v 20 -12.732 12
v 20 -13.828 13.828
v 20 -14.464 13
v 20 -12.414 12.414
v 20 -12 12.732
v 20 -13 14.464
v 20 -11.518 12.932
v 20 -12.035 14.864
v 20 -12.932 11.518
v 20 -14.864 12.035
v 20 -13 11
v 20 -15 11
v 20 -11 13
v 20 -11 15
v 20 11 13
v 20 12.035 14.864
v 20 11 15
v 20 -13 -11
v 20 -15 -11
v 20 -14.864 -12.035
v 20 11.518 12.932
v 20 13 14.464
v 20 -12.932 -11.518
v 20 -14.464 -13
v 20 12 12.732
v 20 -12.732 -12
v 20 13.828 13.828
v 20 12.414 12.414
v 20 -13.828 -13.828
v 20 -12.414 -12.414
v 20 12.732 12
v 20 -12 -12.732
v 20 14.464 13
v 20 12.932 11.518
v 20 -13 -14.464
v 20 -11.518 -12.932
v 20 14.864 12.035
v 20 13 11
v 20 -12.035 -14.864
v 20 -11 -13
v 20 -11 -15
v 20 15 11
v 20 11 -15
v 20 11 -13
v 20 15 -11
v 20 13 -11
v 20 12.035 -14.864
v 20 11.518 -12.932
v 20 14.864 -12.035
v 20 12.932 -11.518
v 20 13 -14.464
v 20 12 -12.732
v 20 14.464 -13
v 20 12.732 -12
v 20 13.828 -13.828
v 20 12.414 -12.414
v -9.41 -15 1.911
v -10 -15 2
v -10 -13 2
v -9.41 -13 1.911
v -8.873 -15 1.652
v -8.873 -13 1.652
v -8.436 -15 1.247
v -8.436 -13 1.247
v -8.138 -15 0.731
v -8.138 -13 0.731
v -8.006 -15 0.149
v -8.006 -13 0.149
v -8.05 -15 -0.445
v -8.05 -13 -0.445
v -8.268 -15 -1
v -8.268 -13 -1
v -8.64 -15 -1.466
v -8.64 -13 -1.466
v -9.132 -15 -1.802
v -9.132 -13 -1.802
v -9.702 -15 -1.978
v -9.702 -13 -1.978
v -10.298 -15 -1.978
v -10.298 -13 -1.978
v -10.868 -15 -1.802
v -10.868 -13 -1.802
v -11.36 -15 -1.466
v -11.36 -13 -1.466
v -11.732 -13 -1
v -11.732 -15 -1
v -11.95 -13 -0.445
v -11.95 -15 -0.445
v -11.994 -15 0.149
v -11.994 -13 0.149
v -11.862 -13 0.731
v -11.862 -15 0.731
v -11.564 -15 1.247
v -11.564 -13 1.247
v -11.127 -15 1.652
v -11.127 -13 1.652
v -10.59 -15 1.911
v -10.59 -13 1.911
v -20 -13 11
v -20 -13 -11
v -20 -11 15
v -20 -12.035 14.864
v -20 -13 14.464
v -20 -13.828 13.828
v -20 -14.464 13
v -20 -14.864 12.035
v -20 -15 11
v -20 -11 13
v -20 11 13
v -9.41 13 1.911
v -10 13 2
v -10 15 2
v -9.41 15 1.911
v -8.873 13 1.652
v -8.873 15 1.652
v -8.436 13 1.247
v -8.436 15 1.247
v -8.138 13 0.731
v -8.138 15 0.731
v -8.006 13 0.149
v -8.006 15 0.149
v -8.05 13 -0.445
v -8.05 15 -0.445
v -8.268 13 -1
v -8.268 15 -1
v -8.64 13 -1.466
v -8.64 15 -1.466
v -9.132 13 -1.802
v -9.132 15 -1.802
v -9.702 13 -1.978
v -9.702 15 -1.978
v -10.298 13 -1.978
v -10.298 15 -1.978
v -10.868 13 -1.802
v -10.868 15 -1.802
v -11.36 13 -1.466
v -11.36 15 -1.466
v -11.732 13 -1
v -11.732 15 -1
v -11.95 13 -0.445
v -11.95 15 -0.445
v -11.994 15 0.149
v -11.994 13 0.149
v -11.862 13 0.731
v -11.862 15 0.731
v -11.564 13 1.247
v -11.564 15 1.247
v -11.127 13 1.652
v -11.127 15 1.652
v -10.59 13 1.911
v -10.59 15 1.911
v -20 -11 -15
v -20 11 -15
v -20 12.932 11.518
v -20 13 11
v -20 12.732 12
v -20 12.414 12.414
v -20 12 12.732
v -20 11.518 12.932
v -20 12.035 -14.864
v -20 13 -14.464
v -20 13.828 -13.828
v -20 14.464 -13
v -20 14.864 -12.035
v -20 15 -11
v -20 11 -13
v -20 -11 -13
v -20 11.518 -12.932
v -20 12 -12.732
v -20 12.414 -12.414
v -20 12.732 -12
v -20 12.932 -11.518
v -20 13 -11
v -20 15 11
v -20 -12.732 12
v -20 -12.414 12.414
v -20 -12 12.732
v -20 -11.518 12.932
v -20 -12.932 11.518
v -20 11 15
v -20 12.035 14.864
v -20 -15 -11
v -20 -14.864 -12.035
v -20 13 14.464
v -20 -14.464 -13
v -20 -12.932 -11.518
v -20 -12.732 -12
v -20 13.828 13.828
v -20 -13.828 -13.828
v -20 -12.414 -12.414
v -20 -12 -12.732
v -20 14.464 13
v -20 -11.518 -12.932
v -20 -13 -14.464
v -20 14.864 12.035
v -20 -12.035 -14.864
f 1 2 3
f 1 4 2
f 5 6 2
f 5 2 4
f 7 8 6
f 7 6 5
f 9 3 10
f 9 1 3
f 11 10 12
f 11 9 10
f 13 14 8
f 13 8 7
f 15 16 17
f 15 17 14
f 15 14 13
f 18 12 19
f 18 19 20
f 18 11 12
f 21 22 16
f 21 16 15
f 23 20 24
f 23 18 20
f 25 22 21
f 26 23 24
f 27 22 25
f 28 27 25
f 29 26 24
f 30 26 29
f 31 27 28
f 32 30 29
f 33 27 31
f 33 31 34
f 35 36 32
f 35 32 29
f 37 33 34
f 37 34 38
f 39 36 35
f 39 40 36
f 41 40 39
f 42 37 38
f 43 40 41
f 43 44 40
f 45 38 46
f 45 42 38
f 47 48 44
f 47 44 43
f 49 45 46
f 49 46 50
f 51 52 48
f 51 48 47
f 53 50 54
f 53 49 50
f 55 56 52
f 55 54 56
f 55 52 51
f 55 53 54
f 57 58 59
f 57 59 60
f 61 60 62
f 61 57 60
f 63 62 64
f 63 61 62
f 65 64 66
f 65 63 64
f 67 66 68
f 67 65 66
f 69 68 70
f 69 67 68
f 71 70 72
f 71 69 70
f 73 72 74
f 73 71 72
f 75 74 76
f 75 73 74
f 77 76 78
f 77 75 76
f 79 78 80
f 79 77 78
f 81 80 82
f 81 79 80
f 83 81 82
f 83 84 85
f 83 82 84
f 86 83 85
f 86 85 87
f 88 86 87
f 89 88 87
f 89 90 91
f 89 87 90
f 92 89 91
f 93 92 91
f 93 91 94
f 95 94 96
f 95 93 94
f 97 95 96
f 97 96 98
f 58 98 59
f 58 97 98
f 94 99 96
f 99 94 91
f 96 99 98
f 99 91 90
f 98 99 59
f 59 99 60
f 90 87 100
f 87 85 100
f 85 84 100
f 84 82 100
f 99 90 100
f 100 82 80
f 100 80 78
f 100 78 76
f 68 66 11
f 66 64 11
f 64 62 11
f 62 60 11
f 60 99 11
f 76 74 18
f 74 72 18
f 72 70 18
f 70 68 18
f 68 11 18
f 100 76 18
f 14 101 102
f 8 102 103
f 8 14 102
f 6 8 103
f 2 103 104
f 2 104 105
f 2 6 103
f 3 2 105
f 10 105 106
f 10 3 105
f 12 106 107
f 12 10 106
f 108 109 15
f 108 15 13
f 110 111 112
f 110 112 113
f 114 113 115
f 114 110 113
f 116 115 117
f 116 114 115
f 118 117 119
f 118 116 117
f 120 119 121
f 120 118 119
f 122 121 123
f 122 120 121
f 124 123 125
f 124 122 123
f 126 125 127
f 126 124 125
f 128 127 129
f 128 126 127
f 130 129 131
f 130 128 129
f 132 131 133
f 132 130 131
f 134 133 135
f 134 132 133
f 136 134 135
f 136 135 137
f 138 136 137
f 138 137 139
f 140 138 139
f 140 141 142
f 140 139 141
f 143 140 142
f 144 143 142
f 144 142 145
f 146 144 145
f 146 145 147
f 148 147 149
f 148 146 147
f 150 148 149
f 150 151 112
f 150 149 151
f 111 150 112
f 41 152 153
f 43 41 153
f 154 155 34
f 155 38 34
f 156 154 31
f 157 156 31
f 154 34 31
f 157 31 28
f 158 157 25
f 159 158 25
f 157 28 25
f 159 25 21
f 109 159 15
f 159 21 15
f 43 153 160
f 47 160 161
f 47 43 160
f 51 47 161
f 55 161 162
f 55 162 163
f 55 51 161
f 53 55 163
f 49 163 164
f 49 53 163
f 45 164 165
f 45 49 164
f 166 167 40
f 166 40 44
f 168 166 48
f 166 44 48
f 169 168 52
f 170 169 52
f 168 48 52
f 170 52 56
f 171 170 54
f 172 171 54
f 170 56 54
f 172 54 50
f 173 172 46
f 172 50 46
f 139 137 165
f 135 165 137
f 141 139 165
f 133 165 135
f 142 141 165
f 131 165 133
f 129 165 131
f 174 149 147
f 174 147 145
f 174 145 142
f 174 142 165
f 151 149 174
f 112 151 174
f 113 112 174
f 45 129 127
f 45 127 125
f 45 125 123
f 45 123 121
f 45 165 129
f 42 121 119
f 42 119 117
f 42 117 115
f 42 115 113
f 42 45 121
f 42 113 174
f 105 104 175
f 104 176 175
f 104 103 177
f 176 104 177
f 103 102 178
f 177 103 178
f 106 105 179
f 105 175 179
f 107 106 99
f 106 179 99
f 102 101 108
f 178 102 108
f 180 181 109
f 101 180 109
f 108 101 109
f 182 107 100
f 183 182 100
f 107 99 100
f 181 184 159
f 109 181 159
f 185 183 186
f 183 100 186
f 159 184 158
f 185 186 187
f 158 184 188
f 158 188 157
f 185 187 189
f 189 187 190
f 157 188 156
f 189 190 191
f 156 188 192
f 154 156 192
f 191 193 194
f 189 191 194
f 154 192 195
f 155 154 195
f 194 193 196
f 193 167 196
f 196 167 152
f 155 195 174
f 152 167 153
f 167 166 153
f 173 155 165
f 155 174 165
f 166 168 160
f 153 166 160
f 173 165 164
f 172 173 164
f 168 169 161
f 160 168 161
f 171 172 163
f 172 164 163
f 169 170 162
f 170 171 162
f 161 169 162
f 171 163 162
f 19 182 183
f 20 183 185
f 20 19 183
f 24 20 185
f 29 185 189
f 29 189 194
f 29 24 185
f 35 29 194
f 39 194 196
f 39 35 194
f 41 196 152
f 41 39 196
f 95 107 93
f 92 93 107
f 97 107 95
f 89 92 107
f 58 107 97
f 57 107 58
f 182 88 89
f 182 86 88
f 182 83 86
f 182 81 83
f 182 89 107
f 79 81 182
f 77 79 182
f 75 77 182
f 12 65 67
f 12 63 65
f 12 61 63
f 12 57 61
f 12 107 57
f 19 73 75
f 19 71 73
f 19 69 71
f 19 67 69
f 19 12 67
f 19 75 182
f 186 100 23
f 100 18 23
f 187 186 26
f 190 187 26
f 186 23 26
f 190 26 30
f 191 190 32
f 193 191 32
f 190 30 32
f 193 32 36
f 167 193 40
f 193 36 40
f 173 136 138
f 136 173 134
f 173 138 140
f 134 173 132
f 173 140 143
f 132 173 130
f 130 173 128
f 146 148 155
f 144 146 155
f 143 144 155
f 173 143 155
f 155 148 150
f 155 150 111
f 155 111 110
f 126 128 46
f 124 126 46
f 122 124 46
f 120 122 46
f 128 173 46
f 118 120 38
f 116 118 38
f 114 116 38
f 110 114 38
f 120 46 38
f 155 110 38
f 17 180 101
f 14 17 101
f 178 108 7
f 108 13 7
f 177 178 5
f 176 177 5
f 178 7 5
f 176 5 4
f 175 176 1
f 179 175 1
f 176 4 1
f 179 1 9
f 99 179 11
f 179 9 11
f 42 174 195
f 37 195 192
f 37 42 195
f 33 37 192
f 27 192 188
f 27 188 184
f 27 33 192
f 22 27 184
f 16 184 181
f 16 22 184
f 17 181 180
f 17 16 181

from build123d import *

# Parameters (mm, degrees)
EXTRUDE_1_DEPTH          = 20
CUT_EXTRUDE_1_DEPTH      = 30.154759474
CUT_EXTRUDE_1_DEPTH_BACK = 30.154759474
SKETCH_2_R               = 2


with BuildPart() as part:
    # 草图1 → 凸台-拉伸1 (new, symmetric)
    with BuildSketch(Plane(origin=(0, 0, 0), x_dir=(0, 0, -1), z_dir=(1, 0, 0))):
        with BuildLine():
            Line((-11, -15), (11, -15))
            ThreePointArc((11, -15), (13.828427125, -13.828427125), (15, -11))
            Line((15, -11), (15, 11))
            ThreePointArc((15, 11), (13.828427125, 13.828427125), (11, 15))
            Line((11, 15), (-11, 15))
            ThreePointArc((-11, 15), (-13.828427125, 13.828427125), (-15, 11))
            Line((-15, 11), (-15, -11))
            ThreePointArc((-15, -11), (-13.828427125, -13.828427125), (-11, -15))
        make_face()
        with BuildLine():
            Line((-11, -13), (11, -13))
            ThreePointArc((11, -13), (12.414213562, -12.414213562), (13, -11))
            Line((13, -11), (13, 11))
            ThreePointArc((13, 11), (12.414213562, 12.414213562), (11, 13))
            Line((11, 13), (-11, 13))
            ThreePointArc((-11, 13), (-12.414213562, 12.414213562), (-13, 11))
            Line((-13, 11), (-13, -11))
            ThreePointArc((-13, -11), (-12.414213562, -12.414213562), (-11, -13))
        make_face(mode=Mode.SUBTRACT)
    extrude(amount=EXTRUDE_1_DEPTH, both=True)

    # 草图2 → 切除-拉伸1 (cut, two sides: drawn at the far end of the back side and taken through both)
    with BuildSketch(Plane(origin=(0, 0, 0), x_dir=(1, 0, 0), z_dir=(0, 1, 0)).offset(-CUT_EXTRUDE_1_DEPTH_BACK)):
        with Locations(Location((-10, 0, 0), (0, 0, 270))):
            Circle(SKETCH_2_R)
    extrude(amount=CUT_EXTRUDE_1_DEPTH + CUT_EXTRUDE_1_DEPTH_BACK, mode=Mode.SUBTRACT)


solid = part.part
